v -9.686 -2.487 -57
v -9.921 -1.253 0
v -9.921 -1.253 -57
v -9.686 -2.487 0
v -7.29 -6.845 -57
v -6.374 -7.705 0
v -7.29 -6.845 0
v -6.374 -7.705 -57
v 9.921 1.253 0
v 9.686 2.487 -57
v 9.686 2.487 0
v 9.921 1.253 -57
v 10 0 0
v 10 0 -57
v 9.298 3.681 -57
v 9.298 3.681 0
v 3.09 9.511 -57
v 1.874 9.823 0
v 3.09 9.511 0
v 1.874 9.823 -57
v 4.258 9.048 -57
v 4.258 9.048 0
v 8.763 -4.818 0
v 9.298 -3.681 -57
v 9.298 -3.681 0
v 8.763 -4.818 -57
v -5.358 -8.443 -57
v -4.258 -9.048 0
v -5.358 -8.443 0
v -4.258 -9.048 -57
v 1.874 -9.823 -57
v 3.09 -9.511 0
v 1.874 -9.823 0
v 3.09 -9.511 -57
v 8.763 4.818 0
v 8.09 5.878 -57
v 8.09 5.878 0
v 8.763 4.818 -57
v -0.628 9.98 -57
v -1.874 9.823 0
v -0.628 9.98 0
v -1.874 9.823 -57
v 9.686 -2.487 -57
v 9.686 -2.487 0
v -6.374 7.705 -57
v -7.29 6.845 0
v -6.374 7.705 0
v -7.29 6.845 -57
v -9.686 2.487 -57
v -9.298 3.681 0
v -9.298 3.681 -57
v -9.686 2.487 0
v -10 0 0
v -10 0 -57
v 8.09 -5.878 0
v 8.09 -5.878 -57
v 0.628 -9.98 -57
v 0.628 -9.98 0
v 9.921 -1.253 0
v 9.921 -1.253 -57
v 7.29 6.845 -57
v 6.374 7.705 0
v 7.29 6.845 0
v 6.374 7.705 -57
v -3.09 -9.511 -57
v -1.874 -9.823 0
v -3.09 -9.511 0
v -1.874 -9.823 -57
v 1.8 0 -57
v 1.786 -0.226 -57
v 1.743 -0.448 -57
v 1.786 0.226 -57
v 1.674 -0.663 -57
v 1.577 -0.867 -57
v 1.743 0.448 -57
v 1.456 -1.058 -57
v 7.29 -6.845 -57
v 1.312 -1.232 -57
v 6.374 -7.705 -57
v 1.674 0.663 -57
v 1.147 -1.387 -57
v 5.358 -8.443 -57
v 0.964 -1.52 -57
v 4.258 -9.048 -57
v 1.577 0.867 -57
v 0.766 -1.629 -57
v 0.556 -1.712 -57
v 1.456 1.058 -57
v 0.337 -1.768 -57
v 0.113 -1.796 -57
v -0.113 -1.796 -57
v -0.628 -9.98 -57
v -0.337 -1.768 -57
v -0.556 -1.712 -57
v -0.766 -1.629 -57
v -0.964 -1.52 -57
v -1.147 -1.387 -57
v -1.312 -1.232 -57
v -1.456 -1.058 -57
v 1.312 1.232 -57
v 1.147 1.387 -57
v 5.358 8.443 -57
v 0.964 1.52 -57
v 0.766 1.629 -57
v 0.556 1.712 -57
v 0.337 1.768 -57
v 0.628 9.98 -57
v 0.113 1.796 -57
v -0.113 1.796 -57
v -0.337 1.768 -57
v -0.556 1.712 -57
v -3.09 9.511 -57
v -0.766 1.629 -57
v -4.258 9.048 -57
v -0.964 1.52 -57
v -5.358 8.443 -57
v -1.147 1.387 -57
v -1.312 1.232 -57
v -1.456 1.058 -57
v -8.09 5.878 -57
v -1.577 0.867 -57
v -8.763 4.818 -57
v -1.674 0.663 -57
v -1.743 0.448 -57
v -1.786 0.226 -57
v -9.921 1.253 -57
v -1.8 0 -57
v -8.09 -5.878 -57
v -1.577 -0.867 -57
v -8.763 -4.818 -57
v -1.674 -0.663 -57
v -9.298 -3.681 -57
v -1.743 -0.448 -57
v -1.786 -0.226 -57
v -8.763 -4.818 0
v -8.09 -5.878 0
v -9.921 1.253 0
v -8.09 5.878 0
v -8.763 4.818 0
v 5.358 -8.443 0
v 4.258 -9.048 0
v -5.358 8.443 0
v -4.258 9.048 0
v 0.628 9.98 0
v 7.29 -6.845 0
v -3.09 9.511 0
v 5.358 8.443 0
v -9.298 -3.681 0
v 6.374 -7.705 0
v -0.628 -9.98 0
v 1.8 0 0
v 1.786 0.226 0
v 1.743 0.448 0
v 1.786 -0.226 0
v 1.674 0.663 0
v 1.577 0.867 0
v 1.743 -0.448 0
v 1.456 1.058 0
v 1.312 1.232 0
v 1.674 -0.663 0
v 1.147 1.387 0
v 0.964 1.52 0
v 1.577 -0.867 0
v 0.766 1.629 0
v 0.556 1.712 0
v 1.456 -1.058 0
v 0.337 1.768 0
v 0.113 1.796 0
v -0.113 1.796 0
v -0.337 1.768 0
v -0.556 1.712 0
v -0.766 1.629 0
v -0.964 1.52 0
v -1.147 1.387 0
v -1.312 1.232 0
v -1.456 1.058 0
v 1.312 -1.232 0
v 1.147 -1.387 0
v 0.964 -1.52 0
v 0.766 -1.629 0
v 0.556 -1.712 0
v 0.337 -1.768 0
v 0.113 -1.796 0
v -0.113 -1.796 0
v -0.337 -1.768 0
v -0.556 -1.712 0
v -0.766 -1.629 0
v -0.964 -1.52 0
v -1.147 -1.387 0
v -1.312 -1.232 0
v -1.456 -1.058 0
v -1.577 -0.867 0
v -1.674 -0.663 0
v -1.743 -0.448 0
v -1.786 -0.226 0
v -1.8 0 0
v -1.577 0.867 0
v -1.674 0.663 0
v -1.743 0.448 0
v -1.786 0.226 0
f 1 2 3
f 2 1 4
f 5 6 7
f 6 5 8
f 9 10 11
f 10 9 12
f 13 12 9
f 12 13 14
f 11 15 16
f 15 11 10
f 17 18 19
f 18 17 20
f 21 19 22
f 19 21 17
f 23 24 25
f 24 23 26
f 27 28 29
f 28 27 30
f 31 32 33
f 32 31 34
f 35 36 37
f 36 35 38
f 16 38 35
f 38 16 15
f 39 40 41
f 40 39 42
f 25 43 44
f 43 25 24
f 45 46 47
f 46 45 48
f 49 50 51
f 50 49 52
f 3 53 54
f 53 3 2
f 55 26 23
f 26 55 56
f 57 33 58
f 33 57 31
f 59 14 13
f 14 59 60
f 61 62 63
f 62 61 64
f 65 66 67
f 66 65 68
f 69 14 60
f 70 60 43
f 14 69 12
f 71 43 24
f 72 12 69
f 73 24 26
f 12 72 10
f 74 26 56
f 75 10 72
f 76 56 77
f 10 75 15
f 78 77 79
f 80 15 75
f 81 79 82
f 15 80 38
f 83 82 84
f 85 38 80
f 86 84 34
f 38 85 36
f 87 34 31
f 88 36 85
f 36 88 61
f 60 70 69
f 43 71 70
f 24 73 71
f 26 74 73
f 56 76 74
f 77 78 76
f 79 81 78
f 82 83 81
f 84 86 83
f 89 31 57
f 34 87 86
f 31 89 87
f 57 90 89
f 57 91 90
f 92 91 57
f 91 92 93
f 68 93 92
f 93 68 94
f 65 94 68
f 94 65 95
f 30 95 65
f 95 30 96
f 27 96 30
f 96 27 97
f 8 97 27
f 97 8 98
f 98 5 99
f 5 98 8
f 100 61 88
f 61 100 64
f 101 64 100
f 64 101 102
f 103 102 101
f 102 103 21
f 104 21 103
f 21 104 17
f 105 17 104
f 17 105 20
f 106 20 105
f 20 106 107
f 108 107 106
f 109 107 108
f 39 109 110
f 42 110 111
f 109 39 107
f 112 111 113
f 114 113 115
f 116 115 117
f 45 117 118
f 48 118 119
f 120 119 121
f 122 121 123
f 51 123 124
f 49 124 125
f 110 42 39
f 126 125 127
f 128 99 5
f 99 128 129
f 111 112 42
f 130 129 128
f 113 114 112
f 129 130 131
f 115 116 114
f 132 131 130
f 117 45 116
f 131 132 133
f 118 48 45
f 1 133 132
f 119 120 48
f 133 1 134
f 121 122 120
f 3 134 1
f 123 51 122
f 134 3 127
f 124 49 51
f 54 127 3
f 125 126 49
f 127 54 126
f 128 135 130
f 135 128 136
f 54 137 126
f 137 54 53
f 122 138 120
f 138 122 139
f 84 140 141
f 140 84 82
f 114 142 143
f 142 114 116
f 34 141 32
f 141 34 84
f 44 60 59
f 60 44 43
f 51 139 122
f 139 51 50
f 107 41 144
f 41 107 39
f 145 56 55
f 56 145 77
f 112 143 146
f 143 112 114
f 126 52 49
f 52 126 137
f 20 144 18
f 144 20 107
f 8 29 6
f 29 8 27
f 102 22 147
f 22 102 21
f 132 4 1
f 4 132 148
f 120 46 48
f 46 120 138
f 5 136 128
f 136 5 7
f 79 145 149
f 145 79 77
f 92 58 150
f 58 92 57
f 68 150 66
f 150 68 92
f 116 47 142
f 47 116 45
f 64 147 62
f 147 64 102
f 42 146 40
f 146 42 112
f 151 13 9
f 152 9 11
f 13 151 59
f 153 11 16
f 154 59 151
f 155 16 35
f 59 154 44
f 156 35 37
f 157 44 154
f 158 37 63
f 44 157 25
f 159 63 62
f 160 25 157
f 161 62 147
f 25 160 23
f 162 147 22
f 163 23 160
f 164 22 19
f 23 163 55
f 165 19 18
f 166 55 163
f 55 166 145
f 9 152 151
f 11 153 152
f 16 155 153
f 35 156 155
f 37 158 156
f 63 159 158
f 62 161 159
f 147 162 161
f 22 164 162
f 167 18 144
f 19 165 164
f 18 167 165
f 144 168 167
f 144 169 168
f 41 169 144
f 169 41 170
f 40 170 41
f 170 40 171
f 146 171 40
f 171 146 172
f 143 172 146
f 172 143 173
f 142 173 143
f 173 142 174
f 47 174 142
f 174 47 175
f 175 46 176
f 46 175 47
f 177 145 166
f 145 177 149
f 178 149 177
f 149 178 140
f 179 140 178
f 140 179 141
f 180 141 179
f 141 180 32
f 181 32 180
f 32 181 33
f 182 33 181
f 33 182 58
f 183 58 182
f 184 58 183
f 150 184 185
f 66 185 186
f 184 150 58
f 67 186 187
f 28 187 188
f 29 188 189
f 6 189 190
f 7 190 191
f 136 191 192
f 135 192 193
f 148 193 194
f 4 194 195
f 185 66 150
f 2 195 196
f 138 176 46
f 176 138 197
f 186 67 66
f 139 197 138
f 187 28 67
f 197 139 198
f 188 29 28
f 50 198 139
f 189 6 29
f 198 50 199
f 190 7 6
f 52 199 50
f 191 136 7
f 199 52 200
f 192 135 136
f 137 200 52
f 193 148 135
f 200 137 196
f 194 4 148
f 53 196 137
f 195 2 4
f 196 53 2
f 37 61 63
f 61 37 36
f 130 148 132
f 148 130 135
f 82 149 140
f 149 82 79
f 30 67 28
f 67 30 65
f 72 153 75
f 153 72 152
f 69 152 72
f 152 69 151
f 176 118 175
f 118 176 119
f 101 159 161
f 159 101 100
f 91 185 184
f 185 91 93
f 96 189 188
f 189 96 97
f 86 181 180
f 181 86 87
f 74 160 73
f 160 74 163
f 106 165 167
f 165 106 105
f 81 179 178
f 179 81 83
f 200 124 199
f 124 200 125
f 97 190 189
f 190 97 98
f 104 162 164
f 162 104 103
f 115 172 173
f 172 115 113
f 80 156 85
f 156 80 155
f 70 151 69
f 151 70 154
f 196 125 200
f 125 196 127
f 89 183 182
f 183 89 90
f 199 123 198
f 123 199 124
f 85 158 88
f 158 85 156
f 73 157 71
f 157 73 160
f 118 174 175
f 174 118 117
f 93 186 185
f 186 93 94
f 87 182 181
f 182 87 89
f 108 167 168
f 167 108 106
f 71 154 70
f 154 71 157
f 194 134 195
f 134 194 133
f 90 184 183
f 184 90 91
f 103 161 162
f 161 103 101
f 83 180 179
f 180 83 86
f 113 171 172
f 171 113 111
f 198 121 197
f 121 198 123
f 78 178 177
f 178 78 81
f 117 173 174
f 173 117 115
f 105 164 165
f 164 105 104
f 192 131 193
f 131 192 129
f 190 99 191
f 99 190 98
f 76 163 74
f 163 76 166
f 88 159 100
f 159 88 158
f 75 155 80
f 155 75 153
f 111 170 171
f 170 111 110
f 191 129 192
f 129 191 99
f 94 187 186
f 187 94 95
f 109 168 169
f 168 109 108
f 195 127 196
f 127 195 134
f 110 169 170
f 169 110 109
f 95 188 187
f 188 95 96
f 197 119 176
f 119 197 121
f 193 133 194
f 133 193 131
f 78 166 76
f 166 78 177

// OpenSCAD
$fn = 50;


difference() {
	union() {
		translate(v = [0, 0, -57.0000000000]) {
			cylinder(h = 57, r = 10.0000000000);
		}
		cylinder(h = 0, r = 20.0000000000);
	}
	union() {
		#translate(v = [0, 0, -57]) {
			cylinder(h = 57, r = 1.8000000000);
		}
	}
}
